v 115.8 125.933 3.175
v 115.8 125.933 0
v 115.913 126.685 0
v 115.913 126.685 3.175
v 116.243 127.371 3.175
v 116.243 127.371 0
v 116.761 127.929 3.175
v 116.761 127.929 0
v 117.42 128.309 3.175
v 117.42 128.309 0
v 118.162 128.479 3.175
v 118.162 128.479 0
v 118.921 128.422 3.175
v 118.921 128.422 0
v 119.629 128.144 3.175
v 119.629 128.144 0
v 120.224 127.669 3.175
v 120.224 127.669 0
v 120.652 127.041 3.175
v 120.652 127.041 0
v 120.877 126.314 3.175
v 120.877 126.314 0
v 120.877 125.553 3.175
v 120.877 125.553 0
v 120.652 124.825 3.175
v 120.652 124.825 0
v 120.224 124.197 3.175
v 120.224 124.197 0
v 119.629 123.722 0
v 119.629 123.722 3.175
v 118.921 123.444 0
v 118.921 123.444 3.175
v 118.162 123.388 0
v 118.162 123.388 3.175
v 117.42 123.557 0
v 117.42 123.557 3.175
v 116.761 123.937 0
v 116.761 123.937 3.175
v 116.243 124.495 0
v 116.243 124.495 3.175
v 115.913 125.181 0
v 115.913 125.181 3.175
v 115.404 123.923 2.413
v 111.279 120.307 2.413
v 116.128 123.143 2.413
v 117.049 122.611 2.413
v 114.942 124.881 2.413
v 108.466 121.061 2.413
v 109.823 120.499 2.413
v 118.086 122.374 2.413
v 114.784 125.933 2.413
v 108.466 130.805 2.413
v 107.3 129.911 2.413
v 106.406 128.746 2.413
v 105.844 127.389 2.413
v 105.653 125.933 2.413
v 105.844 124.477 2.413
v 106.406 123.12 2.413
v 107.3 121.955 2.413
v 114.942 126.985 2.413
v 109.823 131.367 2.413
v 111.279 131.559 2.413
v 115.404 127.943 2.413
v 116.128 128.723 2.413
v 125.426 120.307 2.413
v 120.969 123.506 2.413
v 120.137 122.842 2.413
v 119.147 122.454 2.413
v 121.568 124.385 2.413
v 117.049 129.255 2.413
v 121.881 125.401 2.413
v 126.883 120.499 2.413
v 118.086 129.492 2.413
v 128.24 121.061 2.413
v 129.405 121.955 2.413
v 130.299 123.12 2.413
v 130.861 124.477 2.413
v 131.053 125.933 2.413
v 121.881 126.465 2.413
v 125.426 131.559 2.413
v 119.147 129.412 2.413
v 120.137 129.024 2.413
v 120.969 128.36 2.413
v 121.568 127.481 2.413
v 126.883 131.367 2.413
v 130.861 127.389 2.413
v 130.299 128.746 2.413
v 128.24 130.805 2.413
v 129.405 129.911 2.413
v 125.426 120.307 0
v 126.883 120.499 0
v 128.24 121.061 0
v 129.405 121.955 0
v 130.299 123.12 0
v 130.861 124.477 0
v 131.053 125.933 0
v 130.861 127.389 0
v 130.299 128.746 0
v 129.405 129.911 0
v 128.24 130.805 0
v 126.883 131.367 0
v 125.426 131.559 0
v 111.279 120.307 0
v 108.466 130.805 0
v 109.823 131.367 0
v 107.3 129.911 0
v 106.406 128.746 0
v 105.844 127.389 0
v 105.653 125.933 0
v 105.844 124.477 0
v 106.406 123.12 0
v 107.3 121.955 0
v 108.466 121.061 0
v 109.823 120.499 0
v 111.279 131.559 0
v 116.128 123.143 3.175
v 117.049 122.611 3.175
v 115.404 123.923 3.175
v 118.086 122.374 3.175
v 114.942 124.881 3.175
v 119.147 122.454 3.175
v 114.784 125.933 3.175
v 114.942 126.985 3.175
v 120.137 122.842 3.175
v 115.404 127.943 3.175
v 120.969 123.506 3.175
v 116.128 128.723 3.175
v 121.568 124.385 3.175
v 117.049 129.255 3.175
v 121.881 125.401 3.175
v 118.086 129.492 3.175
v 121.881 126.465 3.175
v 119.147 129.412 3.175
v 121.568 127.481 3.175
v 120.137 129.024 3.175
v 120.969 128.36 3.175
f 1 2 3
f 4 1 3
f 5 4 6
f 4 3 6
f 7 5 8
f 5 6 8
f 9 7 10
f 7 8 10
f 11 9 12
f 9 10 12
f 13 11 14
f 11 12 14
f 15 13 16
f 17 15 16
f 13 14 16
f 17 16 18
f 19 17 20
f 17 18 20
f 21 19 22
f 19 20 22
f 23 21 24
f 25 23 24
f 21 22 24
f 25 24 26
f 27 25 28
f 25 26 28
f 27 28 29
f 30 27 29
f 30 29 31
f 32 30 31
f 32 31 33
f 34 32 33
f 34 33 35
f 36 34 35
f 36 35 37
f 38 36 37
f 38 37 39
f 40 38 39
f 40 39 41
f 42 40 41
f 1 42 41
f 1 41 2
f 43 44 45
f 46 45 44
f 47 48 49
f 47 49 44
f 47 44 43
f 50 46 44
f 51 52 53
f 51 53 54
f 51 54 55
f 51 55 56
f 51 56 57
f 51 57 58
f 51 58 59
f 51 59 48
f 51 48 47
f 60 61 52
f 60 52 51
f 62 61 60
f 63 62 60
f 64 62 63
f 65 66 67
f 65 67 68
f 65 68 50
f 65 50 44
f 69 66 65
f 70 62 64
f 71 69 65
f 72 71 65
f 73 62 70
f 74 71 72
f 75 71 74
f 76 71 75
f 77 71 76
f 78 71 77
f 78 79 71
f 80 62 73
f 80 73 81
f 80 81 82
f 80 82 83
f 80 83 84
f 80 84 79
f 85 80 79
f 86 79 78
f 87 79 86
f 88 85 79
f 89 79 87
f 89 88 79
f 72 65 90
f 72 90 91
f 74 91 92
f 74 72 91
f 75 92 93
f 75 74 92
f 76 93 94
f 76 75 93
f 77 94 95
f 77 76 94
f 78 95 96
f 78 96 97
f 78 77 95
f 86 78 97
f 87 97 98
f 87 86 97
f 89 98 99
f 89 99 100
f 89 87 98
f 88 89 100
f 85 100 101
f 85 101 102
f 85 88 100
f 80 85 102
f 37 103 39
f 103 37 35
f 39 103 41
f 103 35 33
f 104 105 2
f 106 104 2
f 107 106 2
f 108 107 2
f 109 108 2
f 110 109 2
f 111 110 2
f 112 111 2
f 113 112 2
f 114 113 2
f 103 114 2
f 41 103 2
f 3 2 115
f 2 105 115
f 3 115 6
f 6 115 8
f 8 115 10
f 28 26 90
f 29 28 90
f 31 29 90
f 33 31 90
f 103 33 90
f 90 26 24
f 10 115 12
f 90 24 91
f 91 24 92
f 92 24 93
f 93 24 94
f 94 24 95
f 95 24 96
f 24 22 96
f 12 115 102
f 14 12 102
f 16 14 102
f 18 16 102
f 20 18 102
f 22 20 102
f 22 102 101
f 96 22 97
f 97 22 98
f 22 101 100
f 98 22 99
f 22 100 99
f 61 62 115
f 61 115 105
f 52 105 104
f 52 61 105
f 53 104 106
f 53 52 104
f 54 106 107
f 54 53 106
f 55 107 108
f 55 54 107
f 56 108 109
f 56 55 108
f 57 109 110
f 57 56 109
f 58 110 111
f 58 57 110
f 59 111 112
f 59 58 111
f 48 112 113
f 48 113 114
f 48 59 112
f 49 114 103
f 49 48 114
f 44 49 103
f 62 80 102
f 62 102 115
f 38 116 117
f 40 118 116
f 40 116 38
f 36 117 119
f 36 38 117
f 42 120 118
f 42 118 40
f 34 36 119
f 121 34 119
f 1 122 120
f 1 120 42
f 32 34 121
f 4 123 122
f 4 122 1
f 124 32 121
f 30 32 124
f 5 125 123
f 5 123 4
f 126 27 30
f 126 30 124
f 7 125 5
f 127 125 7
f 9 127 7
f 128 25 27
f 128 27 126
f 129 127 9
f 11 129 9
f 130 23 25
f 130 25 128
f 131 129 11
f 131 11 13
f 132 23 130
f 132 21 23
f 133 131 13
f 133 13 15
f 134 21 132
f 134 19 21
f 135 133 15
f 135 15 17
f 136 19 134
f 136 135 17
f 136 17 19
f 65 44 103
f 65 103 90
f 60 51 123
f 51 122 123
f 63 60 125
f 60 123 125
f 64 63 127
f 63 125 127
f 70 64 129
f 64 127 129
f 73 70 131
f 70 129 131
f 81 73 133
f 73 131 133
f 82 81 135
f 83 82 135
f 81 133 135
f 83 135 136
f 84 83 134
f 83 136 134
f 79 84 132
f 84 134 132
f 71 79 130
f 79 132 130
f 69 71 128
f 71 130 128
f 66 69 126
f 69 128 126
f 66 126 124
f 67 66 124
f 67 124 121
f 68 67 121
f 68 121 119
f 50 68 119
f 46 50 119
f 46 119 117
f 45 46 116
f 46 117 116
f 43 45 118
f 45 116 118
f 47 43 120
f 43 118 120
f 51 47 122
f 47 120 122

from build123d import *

# Parameters (mm, degrees)
BOSS_EXTRUDE1_DEPTH         = 2.413
SKETCH2_W                   = 3.5687
SKETCH2_H                   = 0.762
F_1_4_20_TAPPED_HOLE1_D     = 5.1054
F_1_4_20_TAPPED_HOLE1_DEPTH = 16.51
F_1_4_20_TAPPED_HOLE1_TIP   = 1.533816902


with BuildPart() as part:
    # Sketch1 → Boss-Extrude1 (new body)
    with BuildSketch(Plane.XY.offset(2.413)):
        with BuildLine():
            Line((111.27866266, 120.306965896), (125.42646266, 120.306965896))
            ThreePointArc((125.42646266, 120.306965896), (131.05256266, 125.933065896), (125.42646266, 131.559165896))
            Line((125.42646266, 131.559165896), (111.27866266, 131.559165896))
            ThreePointArc((111.27866266, 131.559165896), (105.65256266, 125.933065896), (111.27866266, 120.306965896))
        make_face()
    extrude(amount=-BOSS_EXTRUDE1_DEPTH)

    # Sketch2 → Revolve1 (revolve)
    with BuildSketch(Plane.XZ.offset(-125.933065896), mode=Mode.PRIVATE) as revolve1_sk:
        with Locations((120.13691266, 2.794)):
            Rectangle(SKETCH2_W, SKETCH2_H)
    revolve(revolve1_sk.sketch.rotate(Axis((118.35256266, 125.933065896, 3.175), (0, 0, -1)), 180), axis=Axis((118.35256266, 125.933065896, 3.175), (0, 0, -1)))

    # 1/4-20 Tapped Hole1
    with Locations(Plane.XY.offset(3.175)):
        with Locations((118.35256266, 125.933065896)):
            Hole(F_1_4_20_TAPPED_HOLE1_D / 2, depth=F_1_4_20_TAPPED_HOLE1_DEPTH)
            with Locations((0, 0, -(F_1_4_20_TAPPED_HOLE1_DEPTH + F_1_4_20_TAPPED_HOLE1_TIP / 2))):  # 118° drill point
                Cone(0, F_1_4_20_TAPPED_HOLE1_D / 2, F_1_4_20_TAPPED_HOLE1_TIP, mode=Mode.SUBTRACT)


solid = part.part
